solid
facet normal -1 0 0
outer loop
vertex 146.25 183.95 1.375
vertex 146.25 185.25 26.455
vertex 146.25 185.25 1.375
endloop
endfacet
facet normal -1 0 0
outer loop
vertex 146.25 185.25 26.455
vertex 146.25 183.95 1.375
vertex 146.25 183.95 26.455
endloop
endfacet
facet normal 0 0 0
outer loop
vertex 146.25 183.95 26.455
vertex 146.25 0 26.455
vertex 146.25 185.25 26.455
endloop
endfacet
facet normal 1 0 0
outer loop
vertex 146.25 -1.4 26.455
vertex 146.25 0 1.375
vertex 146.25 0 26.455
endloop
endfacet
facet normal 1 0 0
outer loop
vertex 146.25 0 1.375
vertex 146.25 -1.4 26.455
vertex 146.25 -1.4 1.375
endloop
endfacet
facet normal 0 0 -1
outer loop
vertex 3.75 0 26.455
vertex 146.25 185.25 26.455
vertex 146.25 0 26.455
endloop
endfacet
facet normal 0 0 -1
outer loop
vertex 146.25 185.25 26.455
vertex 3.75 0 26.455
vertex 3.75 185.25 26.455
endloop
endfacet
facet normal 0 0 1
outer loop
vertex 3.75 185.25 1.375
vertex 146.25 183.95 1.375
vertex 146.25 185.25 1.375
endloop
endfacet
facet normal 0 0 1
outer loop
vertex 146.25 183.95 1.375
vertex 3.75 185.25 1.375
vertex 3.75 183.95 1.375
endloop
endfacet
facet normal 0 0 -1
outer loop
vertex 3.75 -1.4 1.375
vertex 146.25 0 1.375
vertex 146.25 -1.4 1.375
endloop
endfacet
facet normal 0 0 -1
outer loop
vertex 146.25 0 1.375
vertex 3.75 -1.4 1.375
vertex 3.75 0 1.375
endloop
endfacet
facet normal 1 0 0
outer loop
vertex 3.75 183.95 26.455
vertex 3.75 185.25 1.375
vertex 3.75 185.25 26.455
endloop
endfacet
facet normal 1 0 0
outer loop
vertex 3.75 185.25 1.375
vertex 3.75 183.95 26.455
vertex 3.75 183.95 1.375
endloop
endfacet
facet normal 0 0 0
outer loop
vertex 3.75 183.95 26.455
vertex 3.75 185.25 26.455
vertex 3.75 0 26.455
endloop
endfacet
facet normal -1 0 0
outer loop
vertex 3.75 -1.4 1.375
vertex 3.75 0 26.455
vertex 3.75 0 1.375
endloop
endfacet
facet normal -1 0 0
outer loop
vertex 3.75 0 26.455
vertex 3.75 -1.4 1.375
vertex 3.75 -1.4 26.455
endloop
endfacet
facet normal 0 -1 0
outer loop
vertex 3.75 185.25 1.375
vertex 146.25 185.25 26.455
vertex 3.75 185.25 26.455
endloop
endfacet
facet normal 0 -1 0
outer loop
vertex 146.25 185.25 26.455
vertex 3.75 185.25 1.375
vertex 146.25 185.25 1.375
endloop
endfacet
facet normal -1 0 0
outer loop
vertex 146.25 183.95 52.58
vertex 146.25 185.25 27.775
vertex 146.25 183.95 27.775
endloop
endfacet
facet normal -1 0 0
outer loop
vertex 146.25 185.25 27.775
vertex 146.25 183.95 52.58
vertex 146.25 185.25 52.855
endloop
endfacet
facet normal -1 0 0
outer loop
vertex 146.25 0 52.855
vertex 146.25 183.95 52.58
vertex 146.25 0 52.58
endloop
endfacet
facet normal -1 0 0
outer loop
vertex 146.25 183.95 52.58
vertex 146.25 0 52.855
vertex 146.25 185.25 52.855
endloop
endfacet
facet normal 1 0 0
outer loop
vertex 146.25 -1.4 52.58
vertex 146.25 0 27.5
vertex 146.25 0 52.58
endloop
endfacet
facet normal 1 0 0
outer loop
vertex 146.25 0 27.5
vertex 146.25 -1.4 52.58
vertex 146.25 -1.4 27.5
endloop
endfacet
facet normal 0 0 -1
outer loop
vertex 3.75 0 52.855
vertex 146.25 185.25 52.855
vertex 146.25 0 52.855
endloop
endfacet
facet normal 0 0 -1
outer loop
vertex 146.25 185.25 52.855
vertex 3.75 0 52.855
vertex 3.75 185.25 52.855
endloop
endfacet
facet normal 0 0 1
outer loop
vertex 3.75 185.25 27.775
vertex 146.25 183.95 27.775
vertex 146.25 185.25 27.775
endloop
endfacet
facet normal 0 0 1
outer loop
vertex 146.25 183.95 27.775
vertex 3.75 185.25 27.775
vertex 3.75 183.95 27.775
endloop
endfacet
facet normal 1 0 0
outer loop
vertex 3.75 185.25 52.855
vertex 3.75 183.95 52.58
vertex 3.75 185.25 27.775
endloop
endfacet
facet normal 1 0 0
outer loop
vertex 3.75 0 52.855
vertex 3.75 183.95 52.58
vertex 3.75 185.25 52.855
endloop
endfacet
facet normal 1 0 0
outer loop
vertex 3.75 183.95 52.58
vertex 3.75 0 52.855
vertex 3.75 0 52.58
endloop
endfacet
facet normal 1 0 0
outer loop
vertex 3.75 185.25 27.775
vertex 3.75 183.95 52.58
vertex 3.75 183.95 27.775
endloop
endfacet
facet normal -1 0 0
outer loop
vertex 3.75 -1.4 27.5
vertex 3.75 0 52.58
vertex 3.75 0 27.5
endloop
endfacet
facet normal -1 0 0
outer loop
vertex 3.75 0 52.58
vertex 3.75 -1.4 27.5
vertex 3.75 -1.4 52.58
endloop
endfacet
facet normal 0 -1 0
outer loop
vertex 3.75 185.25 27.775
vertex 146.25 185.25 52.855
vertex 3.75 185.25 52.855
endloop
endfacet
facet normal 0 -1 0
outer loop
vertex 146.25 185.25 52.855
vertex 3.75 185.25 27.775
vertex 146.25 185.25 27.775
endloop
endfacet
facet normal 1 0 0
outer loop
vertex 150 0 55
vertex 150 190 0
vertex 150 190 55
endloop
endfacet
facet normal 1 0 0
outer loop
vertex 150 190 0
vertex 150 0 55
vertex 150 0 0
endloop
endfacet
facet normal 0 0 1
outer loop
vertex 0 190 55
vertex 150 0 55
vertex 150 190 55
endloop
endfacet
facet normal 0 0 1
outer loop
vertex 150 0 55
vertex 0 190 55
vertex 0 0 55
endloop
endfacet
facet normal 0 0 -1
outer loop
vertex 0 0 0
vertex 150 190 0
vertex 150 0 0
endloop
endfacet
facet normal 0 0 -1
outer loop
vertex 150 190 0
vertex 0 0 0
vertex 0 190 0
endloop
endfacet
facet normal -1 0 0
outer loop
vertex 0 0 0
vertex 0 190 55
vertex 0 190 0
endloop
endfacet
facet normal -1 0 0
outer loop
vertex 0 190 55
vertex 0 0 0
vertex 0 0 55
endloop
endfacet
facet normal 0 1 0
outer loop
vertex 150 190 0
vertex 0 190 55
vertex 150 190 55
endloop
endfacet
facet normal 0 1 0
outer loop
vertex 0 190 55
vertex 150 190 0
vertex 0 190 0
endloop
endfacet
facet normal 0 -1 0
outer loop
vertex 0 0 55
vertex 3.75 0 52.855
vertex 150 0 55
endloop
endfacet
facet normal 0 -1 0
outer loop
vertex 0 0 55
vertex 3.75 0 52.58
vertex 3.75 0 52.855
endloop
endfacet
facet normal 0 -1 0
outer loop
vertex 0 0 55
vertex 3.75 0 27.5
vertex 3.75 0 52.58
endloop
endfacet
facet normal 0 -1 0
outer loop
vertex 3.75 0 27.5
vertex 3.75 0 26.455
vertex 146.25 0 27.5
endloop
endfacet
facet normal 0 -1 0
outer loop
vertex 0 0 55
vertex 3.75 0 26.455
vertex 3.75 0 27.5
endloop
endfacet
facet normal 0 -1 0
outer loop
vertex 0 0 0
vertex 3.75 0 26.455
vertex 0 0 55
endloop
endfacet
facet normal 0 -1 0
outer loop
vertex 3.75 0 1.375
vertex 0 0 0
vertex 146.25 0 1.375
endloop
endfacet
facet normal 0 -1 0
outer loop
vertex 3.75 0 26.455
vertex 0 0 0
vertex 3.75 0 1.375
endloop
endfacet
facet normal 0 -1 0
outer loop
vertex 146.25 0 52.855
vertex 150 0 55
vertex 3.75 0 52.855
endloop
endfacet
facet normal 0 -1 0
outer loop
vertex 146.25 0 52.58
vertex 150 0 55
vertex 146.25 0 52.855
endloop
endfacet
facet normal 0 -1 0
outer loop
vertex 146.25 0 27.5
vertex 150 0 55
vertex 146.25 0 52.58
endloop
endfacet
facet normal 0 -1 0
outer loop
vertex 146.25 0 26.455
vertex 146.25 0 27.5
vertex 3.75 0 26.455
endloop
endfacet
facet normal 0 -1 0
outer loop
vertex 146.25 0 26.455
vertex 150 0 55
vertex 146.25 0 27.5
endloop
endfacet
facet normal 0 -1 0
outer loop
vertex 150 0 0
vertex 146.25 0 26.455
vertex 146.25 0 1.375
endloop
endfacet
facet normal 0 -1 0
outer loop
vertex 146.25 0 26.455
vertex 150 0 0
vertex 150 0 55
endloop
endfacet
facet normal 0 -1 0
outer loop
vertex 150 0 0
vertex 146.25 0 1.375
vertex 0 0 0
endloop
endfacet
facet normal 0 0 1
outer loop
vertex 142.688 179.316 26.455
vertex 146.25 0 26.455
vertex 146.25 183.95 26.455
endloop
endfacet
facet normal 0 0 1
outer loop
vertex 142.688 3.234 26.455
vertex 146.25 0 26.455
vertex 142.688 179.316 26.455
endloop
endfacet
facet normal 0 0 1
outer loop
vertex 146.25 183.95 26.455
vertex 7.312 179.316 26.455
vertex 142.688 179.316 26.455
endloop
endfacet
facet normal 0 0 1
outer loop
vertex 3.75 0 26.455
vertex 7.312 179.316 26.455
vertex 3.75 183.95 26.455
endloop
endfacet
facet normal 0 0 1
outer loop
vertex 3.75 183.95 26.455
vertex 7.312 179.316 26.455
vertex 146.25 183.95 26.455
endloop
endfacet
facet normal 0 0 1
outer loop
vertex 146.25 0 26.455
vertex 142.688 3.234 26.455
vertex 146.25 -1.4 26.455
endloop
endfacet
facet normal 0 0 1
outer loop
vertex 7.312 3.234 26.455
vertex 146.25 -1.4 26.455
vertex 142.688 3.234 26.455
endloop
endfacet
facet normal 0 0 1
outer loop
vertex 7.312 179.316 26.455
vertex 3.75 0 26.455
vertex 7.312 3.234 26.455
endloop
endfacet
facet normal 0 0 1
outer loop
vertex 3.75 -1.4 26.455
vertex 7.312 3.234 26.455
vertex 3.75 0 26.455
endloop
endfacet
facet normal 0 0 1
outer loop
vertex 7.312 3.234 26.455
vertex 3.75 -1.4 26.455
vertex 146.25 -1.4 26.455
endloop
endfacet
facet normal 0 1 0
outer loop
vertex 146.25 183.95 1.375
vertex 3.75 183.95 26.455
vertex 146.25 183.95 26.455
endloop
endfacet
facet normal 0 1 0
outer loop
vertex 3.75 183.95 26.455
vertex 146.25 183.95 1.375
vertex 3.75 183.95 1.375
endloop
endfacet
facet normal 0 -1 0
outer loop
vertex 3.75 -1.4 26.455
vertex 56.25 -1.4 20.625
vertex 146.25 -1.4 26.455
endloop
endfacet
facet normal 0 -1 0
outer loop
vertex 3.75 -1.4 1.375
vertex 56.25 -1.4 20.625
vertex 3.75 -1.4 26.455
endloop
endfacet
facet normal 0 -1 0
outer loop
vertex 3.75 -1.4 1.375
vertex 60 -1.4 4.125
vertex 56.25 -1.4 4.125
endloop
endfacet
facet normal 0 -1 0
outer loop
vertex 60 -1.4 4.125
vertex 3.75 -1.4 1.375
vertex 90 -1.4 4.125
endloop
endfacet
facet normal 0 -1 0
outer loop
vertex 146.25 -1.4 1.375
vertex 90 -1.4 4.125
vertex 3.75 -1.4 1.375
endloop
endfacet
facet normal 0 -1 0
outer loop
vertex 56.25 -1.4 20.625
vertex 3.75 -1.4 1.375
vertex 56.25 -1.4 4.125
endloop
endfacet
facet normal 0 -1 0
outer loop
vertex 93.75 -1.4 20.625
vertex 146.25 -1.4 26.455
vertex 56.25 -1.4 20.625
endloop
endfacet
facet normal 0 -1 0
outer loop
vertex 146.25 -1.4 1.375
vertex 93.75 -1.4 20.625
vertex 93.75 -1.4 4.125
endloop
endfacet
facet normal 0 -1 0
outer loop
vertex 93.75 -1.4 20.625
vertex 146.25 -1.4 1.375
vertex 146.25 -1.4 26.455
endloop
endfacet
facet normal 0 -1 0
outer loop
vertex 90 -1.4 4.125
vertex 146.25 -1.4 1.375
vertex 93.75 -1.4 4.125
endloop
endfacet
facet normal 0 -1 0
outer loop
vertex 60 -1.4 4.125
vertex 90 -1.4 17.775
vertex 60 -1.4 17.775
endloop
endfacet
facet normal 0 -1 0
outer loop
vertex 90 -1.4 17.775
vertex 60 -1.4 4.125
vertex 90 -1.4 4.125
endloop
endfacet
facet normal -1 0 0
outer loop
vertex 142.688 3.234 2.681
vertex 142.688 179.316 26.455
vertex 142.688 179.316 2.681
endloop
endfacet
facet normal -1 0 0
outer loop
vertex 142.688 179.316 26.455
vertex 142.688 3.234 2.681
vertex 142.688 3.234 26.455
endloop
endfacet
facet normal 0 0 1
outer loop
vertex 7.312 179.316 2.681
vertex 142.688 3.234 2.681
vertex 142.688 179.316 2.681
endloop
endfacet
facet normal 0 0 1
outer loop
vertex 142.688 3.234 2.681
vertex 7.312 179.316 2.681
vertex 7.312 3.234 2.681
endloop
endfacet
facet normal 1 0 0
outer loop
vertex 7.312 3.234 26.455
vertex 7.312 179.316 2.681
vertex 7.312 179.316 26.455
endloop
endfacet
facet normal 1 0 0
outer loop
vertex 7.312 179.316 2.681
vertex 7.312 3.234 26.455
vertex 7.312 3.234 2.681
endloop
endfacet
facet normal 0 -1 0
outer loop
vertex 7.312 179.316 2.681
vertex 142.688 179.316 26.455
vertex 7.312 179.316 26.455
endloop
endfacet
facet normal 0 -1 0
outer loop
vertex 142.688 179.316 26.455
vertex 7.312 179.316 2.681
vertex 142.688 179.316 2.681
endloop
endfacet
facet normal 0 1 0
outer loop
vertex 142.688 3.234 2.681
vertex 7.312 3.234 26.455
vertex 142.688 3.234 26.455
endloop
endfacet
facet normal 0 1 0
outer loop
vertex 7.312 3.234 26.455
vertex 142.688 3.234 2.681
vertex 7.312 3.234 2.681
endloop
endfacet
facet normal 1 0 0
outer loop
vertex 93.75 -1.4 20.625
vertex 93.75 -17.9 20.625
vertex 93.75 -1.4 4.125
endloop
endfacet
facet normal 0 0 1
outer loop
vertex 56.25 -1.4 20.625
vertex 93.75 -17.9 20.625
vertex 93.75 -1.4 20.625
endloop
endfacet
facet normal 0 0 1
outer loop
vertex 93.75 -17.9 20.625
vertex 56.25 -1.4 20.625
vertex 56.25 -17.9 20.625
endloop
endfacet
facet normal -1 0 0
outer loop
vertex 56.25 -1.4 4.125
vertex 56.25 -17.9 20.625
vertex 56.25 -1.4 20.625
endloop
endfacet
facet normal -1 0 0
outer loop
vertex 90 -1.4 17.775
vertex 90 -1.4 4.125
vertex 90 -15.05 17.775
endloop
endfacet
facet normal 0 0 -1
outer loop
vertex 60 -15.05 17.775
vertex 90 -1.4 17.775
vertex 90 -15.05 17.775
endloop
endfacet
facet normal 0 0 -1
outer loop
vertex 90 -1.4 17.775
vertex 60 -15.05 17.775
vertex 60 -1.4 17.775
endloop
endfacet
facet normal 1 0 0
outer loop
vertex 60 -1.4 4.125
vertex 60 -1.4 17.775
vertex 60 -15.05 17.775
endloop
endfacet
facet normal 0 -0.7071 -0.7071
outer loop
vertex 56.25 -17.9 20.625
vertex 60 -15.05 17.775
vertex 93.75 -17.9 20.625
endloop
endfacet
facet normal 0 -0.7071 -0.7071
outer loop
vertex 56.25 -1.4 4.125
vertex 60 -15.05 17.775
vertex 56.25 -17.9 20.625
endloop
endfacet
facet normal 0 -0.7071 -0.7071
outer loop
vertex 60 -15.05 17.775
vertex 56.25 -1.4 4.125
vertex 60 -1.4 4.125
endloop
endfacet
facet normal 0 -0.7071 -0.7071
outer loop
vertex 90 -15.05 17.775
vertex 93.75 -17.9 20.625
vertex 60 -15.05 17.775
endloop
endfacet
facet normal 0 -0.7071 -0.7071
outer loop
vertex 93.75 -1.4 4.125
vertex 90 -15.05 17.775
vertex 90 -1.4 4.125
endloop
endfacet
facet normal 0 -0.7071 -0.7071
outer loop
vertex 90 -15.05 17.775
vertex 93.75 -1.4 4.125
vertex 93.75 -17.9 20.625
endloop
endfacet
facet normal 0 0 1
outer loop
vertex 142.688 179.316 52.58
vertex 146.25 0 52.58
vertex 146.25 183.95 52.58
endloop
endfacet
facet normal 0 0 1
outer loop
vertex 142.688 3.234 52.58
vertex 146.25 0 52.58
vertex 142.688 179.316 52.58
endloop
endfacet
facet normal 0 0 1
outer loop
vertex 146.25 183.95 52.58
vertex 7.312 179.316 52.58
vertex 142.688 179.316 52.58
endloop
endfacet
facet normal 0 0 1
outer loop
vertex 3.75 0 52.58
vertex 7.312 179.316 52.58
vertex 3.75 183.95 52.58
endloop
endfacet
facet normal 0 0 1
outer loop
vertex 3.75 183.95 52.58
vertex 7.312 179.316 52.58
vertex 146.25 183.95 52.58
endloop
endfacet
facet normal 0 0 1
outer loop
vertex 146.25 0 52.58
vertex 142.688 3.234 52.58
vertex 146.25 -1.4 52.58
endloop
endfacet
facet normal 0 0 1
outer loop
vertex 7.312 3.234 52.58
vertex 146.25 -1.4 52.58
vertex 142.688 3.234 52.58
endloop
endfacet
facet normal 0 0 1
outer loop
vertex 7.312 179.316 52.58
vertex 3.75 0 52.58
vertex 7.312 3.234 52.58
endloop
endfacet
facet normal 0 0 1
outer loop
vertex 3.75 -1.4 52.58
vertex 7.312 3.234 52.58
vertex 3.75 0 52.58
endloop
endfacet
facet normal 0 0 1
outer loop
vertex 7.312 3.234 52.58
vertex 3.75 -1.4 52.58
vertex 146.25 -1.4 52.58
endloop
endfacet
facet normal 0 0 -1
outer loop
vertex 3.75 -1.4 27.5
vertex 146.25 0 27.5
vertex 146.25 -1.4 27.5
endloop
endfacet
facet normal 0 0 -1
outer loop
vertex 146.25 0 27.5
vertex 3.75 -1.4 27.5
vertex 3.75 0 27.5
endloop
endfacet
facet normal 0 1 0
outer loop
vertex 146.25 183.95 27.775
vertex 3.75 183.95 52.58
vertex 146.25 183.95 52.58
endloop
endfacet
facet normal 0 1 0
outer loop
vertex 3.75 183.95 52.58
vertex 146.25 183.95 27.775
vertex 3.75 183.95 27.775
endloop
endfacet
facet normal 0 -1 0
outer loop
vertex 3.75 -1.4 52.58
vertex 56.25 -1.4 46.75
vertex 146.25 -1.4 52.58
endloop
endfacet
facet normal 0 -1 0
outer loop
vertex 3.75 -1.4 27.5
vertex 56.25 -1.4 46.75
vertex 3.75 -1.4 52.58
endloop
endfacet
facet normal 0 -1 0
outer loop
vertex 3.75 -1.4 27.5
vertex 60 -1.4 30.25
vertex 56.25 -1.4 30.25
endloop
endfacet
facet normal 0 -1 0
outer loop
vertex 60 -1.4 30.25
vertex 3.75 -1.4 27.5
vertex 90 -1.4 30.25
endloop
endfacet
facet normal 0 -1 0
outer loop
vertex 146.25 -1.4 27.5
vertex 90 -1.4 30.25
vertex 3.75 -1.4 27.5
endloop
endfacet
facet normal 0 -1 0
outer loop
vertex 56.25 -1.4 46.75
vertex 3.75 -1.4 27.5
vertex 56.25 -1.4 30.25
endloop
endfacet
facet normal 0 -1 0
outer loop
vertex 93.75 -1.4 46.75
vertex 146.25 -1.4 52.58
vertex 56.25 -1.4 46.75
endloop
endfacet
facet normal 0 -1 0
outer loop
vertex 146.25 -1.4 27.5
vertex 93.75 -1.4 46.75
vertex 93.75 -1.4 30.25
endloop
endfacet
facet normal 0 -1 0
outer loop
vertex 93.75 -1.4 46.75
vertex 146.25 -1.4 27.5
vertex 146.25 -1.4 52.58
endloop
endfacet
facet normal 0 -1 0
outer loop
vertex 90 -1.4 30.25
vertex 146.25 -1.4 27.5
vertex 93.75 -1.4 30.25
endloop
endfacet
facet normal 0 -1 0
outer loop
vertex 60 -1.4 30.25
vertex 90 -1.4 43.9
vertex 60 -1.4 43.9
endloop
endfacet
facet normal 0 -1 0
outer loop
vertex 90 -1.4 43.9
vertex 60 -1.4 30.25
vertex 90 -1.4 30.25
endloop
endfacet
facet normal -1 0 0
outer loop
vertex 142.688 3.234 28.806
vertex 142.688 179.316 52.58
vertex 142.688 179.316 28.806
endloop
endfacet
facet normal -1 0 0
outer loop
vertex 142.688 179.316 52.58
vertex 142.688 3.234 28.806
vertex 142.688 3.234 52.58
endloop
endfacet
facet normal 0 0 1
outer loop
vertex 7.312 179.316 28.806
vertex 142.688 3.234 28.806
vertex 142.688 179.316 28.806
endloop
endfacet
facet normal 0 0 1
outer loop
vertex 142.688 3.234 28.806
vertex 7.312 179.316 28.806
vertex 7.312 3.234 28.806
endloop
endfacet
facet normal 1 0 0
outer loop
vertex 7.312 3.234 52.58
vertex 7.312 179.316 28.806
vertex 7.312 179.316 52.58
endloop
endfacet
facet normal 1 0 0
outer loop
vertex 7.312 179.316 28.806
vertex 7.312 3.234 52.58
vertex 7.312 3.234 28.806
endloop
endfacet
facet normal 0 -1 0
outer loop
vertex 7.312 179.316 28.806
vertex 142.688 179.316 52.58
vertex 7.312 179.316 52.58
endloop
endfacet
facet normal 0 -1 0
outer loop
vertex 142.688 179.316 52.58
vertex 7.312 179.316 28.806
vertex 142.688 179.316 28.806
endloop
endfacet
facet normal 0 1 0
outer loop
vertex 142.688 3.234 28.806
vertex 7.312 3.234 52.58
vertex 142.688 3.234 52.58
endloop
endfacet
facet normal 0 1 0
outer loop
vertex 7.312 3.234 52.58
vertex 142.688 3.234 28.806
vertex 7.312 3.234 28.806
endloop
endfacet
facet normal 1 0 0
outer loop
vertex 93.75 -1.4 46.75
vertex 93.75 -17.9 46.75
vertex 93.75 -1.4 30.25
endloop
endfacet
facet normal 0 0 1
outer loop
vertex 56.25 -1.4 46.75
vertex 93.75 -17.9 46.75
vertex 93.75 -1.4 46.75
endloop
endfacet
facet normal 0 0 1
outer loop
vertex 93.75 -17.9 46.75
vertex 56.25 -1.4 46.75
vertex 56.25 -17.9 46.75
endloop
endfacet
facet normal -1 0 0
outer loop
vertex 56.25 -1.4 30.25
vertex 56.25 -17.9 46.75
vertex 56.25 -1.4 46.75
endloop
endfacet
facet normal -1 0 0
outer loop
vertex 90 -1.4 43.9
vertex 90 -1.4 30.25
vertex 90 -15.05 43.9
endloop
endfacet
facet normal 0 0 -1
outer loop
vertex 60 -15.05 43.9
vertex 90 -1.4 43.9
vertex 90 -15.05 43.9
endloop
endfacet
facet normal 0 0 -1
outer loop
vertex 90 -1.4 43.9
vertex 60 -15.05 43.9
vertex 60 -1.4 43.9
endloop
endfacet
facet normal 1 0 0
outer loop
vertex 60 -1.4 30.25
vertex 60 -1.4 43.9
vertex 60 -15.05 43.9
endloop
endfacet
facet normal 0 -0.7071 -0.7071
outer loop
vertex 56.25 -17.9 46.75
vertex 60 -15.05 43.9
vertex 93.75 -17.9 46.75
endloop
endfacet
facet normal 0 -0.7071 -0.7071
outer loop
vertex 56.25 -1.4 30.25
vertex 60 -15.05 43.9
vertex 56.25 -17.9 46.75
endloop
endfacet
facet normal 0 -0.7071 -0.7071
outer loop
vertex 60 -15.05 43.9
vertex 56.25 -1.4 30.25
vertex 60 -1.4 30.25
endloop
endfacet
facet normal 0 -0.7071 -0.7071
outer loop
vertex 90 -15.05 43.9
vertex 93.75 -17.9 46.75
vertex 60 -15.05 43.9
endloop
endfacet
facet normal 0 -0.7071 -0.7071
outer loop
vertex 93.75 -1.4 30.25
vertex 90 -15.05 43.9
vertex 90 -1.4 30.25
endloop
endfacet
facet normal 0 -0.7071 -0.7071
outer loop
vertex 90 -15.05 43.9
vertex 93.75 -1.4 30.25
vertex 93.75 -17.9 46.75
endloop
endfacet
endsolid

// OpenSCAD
// file: case.scad
$fn=10;

width = 150;
length = 190;
heighth = 55;

module drawer_case(width, length, heighth){
	difference(){
		cube([width, length, heighth]);
		translate([(width*.05)/2,-.1,(heighth*.05)/2]){
			scale([1,1,.48]){
				cube([width-(width*.05),length-(length*.025)+.1,heighth-(heighth*.05)]);
				translate([0,0,heighth]){
					cube([width-(width*.05),length-(length*.025)+.1,heighth-(heighth*.05)]);
				}
			}
		}
	}
}

module drawer_shell(width, length, heighth){
	d_width = width-(width*.05);
	d_length = length-(length*.025)+.1;
	d_heighth = heighth-(heighth*.05);
	difference(){
		scale([1,1,.48]){
			cube([d_width, d_length, d_heighth]);
		}
		translate([(d_width*.05)/2,(d_length*.025),(d_heighth*.05)/2]){
			scale([.95,.95,.95]){
				cube([d_width, d_length,d_heighth*.48]);
			}
		}
	}
}

module drawer_handle(width,length,heighth){
	difference(){
		difference(){	
			cube([width*.25,length*.10,heighth*.30]);
			translate([width*.025,-.1,-.1]){
				cube([width*.20,length*.20,heighth*.25]);
			}
		}
		translate([-2,length*.10,0]){
			rotate([135,0,0]){
				cube([width,length*.15,heighth*.30]);
			}
		}
	}

}

module drawer(width,length,heighth){
	translate([0,10,0]){
		drawer_shell(width,length,heighth);
		translate([width*.35,-length*.10,heighth*.05]){
			drawer_handle(width,length,heighth);
		}
	}
}




drawer_case(width,length,heighth);
translate([(width*.05)/2,-length*.06,]){
	translate([0,0,(heighth*.05)/2]){
		drawer(width,length,heighth);
	}
	translate([0,0,heighth-(heighth*.5)]){
		drawer(width,length,heighth);
	}
}
//translate([width+2,0,0]){
//	drawer_shell(width,length,heighth);
//}
//
//translate([width*2,0,0]){
//	drawer_handle(width,length,heighth);
//}

	
// main file
include <case.scad>

width = 150;
length = 190;
heighth = 55;

drawer_case(width,length,heighth);
